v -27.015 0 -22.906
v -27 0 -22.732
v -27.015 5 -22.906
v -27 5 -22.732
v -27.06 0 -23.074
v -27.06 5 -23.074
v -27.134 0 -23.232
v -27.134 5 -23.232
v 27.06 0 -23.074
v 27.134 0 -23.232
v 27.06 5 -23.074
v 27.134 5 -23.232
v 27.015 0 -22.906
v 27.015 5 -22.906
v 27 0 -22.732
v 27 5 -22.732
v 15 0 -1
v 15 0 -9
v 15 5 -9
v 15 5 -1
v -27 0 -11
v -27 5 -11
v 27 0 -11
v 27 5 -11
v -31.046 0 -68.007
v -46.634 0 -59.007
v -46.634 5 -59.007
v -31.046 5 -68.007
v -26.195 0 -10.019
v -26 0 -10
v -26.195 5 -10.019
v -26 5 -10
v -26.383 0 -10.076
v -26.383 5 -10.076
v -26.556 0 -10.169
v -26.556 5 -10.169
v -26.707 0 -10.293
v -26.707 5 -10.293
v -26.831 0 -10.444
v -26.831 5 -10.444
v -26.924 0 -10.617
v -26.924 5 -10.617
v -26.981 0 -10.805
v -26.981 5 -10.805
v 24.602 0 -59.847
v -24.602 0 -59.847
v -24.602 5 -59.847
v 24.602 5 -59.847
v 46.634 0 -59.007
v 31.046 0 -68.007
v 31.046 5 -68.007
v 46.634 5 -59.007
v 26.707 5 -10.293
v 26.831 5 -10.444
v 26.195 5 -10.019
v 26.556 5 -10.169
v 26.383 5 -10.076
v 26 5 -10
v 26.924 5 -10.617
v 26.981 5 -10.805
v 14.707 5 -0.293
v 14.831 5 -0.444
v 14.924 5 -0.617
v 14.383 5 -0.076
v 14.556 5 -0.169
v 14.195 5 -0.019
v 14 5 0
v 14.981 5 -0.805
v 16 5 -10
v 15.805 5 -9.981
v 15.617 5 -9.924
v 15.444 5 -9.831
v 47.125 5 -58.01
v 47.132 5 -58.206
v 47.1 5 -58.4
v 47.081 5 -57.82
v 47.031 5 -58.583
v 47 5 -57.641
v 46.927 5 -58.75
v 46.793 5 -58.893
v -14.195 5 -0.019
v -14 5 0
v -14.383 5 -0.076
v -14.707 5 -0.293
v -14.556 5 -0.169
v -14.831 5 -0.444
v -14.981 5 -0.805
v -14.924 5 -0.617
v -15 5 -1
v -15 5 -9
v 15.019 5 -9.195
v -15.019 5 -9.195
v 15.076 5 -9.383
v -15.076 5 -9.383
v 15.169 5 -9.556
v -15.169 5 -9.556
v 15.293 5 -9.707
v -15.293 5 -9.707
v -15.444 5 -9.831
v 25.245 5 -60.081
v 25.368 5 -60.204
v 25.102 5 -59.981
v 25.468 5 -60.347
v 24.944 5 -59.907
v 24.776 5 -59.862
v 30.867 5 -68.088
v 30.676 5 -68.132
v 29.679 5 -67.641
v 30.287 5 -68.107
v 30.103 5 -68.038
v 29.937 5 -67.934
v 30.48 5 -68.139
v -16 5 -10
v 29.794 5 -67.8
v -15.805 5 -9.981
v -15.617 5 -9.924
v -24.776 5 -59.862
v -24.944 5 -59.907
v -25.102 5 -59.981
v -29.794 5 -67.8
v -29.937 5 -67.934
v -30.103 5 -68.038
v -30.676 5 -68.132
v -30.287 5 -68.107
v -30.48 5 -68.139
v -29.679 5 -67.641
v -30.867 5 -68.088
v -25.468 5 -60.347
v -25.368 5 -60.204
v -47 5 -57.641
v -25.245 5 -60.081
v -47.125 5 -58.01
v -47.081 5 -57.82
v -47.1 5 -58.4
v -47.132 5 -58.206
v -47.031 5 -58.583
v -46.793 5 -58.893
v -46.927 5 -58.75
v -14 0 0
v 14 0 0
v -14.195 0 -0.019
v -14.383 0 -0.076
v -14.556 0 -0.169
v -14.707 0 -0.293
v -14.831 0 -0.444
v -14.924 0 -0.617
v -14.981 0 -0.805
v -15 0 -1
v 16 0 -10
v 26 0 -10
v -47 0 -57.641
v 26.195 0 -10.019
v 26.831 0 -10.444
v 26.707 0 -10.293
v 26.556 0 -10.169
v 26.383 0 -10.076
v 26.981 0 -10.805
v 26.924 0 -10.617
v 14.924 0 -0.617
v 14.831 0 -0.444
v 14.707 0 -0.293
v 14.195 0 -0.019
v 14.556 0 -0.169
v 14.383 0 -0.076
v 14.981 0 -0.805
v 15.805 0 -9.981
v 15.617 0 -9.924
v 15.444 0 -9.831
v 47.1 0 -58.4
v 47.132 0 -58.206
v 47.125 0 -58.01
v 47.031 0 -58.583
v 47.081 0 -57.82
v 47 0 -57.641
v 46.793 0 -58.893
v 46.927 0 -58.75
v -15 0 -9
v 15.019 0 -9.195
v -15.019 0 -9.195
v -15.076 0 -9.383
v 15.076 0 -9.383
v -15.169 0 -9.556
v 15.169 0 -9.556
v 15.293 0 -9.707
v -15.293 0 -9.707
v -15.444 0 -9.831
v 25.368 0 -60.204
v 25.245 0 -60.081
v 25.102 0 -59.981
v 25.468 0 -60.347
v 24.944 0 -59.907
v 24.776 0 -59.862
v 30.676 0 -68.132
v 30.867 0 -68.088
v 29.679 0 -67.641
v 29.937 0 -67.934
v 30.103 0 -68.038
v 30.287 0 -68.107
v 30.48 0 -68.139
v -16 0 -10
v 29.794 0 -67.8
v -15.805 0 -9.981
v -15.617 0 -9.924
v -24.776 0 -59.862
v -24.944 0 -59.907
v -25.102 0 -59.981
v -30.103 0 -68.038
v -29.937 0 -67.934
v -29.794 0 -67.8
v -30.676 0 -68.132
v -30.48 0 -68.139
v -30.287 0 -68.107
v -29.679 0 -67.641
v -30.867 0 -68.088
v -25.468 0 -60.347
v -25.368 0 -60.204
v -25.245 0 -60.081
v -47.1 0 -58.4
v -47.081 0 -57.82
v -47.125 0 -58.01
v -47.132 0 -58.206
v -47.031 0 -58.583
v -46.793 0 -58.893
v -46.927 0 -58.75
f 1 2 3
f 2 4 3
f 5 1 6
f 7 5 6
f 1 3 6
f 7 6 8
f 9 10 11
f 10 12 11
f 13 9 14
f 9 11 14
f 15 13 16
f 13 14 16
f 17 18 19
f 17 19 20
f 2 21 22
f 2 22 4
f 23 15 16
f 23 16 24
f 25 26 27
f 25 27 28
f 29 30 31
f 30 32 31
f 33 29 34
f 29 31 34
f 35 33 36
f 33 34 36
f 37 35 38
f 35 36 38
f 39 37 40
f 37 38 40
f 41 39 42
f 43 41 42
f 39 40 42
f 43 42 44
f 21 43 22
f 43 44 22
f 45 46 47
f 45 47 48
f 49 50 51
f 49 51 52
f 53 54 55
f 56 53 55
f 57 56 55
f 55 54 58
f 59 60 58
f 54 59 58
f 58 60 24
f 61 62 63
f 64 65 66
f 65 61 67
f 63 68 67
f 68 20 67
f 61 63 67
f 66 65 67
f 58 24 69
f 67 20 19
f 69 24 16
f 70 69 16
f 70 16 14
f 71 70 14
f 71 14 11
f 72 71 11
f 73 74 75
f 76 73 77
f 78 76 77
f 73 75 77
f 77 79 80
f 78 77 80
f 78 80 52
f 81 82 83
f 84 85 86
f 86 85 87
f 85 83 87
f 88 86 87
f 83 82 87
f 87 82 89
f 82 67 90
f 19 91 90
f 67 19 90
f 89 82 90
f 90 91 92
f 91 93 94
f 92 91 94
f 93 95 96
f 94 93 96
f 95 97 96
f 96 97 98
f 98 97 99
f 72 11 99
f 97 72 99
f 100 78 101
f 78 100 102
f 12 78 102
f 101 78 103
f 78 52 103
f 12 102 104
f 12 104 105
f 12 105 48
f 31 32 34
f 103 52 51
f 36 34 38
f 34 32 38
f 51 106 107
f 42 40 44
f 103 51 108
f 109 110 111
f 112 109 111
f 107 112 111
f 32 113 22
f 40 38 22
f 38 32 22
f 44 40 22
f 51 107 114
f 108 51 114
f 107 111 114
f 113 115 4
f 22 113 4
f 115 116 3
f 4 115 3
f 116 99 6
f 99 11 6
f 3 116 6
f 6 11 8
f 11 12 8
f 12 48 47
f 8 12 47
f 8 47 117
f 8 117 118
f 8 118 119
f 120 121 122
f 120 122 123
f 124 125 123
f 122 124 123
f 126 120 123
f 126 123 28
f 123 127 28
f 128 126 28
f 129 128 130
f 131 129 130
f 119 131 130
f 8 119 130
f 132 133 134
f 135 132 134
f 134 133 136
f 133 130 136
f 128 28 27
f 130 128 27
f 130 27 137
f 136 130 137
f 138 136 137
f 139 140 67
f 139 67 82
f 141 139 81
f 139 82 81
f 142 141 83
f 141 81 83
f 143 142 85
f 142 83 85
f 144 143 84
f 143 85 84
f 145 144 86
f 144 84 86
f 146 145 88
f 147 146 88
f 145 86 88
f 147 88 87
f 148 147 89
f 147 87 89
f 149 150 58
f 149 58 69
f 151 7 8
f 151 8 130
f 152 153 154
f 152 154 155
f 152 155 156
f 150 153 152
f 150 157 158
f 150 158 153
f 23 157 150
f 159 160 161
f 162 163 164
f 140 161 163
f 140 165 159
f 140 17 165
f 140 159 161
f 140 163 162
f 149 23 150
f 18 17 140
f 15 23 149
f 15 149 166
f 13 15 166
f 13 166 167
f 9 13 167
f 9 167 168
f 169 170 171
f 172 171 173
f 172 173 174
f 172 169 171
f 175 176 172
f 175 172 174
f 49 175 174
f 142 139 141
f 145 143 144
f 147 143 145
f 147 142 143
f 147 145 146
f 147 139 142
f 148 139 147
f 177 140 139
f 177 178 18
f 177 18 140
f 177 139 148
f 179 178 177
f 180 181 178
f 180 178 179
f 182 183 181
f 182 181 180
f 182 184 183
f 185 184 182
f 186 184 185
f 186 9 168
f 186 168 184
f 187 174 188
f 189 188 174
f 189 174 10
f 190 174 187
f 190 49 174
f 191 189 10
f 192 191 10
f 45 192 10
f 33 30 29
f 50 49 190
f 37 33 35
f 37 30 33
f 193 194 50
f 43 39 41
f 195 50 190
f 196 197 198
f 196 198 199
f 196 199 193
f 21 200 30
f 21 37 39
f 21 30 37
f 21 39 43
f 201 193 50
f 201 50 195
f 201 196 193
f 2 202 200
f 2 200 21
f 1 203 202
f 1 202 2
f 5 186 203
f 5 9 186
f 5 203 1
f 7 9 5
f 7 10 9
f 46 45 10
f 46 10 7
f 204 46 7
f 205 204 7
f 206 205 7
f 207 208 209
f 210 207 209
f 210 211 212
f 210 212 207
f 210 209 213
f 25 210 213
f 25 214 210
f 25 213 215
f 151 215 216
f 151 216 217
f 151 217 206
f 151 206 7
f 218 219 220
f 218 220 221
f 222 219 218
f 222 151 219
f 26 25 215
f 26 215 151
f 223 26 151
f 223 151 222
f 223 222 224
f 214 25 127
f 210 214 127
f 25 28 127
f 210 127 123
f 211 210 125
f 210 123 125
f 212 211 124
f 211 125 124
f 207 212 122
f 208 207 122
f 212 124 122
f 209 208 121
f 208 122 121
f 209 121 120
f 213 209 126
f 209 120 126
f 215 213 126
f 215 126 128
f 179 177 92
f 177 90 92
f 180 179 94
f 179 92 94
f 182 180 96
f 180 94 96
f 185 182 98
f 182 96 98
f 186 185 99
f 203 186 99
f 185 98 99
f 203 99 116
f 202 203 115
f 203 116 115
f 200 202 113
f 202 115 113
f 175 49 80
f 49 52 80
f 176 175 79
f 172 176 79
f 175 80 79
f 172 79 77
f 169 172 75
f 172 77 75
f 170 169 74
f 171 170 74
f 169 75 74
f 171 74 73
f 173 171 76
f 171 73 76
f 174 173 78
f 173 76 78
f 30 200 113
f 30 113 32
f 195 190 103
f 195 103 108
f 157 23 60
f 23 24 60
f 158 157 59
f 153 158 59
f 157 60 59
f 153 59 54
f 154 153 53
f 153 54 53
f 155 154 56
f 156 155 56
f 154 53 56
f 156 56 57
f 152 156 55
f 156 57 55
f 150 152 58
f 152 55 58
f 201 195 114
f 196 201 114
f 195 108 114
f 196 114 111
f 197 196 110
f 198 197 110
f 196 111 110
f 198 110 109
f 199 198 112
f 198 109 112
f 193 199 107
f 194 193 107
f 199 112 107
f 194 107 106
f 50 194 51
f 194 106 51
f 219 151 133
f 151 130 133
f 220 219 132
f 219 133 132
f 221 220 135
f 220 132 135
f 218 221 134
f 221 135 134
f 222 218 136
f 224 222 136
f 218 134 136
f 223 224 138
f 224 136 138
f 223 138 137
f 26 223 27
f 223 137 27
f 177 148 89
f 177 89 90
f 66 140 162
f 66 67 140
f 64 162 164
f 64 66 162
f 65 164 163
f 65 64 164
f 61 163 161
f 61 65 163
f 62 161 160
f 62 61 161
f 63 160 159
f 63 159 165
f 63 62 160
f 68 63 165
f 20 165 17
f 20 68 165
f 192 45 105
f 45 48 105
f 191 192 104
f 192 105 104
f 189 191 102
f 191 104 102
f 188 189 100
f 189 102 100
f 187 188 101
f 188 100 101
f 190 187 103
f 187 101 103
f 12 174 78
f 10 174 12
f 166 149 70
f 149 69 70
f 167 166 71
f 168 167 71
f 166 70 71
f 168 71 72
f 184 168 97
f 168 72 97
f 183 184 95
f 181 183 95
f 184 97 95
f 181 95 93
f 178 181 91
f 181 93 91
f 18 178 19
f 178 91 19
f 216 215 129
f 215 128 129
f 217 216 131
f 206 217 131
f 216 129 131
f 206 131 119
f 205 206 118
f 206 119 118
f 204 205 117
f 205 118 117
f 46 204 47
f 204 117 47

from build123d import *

# Parameters (mm, degrees)
EXTRUDE_1_DEPTH = 5
FILLET_1_R      = 1


with BuildPart() as part:
    # 草圖1 → 填料-伸長1 (new body)
    with BuildSketch(Plane(origin=(0, 0, 0), x_dir=(1, 0, 0), z_dir=(0, 1, 0))):
        Polygon((15, 0), (-15, 0), (-15, 10), (-27, 10), (-27, 23), (-47.5, 58.507041555), (-30.179491924, 68.507041555), (-25.179491924, 59.846787517), (25.179491924, 59.846787517), (30.179491924, 68.507041555), (47.5, 58.507041555), (27, 23), (27, 10), (15, 10), align=None)
    extrude(amount=EXTRUDE_1_DEPTH)

    # 圓角1
    fillet_1_edges = [part.edges().sort_by_distance(p)[0] for p in [
        (-27, 2.5, -10),
        (-27, 2.5, -23),
        (-47.5, 2.5, -58.507041555),
        (-30.179491924, 2.5, -68.507041555),
        (-25.179491924, 2.5, -59.846787517),
        (25.179491924, 2.5, -59.846787517),
        (30.179491924, 2.5, -68.507041555),
        (47.5, 2.5, -58.507041555),
        (27, 2.5, -23),
        (27, 2.5, -10),
        (15, 2.5, -10),
        (15, 2.5, 0),
        (-15, 2.5, 0),
        (-15, 2.5, -10),
    ]]
    fillet(fillet_1_edges, radius=FILLET_1_R)


solid = part.part
